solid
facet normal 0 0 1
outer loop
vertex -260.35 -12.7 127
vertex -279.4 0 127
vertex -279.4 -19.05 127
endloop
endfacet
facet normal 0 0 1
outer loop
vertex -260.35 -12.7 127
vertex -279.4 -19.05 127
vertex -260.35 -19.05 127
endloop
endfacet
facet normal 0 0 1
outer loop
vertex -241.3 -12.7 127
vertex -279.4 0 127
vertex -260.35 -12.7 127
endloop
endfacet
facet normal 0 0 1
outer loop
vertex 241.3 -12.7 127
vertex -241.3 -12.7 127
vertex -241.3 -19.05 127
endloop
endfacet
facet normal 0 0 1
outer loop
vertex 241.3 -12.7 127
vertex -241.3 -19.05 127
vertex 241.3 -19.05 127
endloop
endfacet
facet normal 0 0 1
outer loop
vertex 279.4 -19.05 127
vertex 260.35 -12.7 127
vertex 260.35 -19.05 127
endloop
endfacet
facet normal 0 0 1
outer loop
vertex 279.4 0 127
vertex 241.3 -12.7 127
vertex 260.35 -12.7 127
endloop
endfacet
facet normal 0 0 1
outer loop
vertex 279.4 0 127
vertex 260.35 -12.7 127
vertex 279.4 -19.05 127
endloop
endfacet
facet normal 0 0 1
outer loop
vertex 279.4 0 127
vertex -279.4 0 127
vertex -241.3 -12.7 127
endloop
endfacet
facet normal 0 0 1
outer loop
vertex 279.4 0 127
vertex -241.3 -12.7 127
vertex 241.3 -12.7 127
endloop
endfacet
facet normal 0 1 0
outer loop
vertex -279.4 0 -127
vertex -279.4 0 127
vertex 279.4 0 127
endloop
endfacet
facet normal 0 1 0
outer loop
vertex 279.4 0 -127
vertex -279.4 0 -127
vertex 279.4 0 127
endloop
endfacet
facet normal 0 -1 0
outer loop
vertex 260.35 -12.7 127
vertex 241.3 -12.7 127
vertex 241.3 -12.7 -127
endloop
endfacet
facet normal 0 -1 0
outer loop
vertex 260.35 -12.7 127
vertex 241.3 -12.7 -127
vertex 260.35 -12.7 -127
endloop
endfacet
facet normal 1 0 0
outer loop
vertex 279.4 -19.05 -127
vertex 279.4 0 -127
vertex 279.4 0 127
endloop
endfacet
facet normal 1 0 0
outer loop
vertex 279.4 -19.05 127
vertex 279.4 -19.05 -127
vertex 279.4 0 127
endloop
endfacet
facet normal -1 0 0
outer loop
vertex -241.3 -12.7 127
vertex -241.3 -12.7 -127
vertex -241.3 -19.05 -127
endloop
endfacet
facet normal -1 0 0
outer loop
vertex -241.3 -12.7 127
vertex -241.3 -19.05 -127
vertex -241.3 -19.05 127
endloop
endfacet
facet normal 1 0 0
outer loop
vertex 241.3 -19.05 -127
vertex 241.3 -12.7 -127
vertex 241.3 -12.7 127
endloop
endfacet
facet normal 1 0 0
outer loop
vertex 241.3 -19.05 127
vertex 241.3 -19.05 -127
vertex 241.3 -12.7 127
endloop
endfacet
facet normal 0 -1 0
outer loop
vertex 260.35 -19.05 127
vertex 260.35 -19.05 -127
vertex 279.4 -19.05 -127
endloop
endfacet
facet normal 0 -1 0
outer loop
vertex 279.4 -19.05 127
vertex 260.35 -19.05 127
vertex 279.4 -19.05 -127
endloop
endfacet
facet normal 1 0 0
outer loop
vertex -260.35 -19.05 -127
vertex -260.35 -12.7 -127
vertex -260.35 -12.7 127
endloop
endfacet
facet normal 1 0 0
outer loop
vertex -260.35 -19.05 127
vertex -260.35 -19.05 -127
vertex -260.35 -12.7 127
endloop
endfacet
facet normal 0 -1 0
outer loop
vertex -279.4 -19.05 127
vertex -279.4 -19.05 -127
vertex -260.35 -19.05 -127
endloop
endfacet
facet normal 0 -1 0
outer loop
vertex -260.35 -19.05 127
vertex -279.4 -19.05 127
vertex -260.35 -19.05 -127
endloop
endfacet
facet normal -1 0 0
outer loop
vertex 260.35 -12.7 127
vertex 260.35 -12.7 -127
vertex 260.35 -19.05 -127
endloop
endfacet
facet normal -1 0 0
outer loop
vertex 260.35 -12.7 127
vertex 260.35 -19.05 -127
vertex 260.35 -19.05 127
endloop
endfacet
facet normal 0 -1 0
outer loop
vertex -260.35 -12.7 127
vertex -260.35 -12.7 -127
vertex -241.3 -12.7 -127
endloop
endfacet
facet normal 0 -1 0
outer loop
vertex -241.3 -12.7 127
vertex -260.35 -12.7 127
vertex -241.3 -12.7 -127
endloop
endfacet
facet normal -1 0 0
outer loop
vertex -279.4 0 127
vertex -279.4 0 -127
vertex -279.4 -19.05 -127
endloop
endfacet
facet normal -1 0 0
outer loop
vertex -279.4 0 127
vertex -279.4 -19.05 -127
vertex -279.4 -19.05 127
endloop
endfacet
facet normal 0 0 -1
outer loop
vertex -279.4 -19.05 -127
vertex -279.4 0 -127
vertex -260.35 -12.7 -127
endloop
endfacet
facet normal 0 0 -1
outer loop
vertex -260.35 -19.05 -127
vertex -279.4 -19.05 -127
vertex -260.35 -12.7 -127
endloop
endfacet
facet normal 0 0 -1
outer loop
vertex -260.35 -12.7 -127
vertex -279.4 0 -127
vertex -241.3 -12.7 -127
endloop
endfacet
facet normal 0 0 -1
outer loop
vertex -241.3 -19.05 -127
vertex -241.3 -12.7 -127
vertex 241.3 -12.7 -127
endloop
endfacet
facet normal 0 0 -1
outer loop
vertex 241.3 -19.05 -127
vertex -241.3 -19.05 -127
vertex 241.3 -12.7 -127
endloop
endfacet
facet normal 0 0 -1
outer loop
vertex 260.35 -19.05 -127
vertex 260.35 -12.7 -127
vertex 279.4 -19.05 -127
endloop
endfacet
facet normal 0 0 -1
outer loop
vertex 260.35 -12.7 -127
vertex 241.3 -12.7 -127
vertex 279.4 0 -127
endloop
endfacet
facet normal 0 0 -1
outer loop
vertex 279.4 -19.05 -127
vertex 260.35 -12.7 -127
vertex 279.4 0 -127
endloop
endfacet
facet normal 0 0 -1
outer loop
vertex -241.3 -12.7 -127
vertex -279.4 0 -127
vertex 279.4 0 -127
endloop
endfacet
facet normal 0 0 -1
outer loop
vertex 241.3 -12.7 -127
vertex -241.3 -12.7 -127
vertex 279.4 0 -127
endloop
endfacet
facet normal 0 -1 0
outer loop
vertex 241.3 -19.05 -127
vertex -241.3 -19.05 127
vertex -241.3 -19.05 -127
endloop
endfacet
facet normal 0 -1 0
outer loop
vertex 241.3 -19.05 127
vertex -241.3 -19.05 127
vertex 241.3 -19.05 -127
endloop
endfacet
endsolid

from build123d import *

# Parameters (mm, degrees)
F0_W     = 19.05
F0_H     = 254
F1_DEPTH = 19.05
F0_W_2   = 241.3
F2_DEPTH = 12.7


with BuildPart() as f1:
    # F0 (on Front) → F1 (new body)
    with BuildSketch(Plane.XZ):
        with Locations((-269.875, 0)):
            Rectangle(F0_W, F0_H)
    extrude(amount=F1_DEPTH)



with BuildPart() as f1b:
    # F0 (on Front) → F1, piece 2 (new body)
    with BuildSketch(Plane.XZ):
        with Locations((-120.65, 0)):
            Rectangle(F0_W_2, F0_H)
        with Locations((120.65, 0)):
            Rectangle(F0_W_2, F0_H)
    extrude(amount=F1_DEPTH)


with BuildPart() as f1c:
    # F0 (on Front) → F1, piece 3 (new body)
    with BuildSketch(Plane.XZ):
        with Locations((269.875, 0)):
            Rectangle(F0_W, F0_H)
    extrude(amount=F1_DEPTH)


with BuildPart() as f1_1:
    add(f1.part)

    add(f1b.part)  # F2 merges F1b

    add(f1c.part)  # F2 merges F1c
    # F0 (on Front) → F2 (join)
    with BuildSketch(Plane.XZ):
        with Locations((-250.825, 0)):
            Rectangle(F0_W, F0_H)
        with Locations((250.825, 0)):
            Rectangle(F0_W, F0_H)
    extrude(amount=F2_DEPTH)


solid = f1_1.part
